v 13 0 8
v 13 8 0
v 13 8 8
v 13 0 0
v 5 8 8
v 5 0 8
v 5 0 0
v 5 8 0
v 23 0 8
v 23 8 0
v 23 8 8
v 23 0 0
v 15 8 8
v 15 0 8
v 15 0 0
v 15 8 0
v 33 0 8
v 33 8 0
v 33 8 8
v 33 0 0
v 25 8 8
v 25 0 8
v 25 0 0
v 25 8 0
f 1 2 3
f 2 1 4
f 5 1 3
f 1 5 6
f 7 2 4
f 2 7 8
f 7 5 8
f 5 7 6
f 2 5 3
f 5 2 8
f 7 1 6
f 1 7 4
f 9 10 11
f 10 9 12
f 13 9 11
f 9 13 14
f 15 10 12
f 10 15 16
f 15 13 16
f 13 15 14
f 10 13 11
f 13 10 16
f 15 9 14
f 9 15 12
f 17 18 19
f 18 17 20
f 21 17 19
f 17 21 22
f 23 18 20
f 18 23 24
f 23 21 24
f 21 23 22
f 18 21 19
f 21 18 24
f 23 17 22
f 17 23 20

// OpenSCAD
/*!
  Highlight an issue to keep in mind:
  If we first render (F6) the second line only:
    for (i=[0:2]) translate([i*10,0,0]) cube(8);
  and then the whole design: 
    translate([5,0,0]) for (i=[0:2]) translate([i*10,0,0]) cube(8);

  ..the first for node was cached, but since the CGAL renderer cannot render GeometryList nodes, it failed.

  This was fixed by not caching ListNode instances.
*/

translate([5,0,0])
for (i=[0:2]) translate([i*10,0,0]) cube(8);
